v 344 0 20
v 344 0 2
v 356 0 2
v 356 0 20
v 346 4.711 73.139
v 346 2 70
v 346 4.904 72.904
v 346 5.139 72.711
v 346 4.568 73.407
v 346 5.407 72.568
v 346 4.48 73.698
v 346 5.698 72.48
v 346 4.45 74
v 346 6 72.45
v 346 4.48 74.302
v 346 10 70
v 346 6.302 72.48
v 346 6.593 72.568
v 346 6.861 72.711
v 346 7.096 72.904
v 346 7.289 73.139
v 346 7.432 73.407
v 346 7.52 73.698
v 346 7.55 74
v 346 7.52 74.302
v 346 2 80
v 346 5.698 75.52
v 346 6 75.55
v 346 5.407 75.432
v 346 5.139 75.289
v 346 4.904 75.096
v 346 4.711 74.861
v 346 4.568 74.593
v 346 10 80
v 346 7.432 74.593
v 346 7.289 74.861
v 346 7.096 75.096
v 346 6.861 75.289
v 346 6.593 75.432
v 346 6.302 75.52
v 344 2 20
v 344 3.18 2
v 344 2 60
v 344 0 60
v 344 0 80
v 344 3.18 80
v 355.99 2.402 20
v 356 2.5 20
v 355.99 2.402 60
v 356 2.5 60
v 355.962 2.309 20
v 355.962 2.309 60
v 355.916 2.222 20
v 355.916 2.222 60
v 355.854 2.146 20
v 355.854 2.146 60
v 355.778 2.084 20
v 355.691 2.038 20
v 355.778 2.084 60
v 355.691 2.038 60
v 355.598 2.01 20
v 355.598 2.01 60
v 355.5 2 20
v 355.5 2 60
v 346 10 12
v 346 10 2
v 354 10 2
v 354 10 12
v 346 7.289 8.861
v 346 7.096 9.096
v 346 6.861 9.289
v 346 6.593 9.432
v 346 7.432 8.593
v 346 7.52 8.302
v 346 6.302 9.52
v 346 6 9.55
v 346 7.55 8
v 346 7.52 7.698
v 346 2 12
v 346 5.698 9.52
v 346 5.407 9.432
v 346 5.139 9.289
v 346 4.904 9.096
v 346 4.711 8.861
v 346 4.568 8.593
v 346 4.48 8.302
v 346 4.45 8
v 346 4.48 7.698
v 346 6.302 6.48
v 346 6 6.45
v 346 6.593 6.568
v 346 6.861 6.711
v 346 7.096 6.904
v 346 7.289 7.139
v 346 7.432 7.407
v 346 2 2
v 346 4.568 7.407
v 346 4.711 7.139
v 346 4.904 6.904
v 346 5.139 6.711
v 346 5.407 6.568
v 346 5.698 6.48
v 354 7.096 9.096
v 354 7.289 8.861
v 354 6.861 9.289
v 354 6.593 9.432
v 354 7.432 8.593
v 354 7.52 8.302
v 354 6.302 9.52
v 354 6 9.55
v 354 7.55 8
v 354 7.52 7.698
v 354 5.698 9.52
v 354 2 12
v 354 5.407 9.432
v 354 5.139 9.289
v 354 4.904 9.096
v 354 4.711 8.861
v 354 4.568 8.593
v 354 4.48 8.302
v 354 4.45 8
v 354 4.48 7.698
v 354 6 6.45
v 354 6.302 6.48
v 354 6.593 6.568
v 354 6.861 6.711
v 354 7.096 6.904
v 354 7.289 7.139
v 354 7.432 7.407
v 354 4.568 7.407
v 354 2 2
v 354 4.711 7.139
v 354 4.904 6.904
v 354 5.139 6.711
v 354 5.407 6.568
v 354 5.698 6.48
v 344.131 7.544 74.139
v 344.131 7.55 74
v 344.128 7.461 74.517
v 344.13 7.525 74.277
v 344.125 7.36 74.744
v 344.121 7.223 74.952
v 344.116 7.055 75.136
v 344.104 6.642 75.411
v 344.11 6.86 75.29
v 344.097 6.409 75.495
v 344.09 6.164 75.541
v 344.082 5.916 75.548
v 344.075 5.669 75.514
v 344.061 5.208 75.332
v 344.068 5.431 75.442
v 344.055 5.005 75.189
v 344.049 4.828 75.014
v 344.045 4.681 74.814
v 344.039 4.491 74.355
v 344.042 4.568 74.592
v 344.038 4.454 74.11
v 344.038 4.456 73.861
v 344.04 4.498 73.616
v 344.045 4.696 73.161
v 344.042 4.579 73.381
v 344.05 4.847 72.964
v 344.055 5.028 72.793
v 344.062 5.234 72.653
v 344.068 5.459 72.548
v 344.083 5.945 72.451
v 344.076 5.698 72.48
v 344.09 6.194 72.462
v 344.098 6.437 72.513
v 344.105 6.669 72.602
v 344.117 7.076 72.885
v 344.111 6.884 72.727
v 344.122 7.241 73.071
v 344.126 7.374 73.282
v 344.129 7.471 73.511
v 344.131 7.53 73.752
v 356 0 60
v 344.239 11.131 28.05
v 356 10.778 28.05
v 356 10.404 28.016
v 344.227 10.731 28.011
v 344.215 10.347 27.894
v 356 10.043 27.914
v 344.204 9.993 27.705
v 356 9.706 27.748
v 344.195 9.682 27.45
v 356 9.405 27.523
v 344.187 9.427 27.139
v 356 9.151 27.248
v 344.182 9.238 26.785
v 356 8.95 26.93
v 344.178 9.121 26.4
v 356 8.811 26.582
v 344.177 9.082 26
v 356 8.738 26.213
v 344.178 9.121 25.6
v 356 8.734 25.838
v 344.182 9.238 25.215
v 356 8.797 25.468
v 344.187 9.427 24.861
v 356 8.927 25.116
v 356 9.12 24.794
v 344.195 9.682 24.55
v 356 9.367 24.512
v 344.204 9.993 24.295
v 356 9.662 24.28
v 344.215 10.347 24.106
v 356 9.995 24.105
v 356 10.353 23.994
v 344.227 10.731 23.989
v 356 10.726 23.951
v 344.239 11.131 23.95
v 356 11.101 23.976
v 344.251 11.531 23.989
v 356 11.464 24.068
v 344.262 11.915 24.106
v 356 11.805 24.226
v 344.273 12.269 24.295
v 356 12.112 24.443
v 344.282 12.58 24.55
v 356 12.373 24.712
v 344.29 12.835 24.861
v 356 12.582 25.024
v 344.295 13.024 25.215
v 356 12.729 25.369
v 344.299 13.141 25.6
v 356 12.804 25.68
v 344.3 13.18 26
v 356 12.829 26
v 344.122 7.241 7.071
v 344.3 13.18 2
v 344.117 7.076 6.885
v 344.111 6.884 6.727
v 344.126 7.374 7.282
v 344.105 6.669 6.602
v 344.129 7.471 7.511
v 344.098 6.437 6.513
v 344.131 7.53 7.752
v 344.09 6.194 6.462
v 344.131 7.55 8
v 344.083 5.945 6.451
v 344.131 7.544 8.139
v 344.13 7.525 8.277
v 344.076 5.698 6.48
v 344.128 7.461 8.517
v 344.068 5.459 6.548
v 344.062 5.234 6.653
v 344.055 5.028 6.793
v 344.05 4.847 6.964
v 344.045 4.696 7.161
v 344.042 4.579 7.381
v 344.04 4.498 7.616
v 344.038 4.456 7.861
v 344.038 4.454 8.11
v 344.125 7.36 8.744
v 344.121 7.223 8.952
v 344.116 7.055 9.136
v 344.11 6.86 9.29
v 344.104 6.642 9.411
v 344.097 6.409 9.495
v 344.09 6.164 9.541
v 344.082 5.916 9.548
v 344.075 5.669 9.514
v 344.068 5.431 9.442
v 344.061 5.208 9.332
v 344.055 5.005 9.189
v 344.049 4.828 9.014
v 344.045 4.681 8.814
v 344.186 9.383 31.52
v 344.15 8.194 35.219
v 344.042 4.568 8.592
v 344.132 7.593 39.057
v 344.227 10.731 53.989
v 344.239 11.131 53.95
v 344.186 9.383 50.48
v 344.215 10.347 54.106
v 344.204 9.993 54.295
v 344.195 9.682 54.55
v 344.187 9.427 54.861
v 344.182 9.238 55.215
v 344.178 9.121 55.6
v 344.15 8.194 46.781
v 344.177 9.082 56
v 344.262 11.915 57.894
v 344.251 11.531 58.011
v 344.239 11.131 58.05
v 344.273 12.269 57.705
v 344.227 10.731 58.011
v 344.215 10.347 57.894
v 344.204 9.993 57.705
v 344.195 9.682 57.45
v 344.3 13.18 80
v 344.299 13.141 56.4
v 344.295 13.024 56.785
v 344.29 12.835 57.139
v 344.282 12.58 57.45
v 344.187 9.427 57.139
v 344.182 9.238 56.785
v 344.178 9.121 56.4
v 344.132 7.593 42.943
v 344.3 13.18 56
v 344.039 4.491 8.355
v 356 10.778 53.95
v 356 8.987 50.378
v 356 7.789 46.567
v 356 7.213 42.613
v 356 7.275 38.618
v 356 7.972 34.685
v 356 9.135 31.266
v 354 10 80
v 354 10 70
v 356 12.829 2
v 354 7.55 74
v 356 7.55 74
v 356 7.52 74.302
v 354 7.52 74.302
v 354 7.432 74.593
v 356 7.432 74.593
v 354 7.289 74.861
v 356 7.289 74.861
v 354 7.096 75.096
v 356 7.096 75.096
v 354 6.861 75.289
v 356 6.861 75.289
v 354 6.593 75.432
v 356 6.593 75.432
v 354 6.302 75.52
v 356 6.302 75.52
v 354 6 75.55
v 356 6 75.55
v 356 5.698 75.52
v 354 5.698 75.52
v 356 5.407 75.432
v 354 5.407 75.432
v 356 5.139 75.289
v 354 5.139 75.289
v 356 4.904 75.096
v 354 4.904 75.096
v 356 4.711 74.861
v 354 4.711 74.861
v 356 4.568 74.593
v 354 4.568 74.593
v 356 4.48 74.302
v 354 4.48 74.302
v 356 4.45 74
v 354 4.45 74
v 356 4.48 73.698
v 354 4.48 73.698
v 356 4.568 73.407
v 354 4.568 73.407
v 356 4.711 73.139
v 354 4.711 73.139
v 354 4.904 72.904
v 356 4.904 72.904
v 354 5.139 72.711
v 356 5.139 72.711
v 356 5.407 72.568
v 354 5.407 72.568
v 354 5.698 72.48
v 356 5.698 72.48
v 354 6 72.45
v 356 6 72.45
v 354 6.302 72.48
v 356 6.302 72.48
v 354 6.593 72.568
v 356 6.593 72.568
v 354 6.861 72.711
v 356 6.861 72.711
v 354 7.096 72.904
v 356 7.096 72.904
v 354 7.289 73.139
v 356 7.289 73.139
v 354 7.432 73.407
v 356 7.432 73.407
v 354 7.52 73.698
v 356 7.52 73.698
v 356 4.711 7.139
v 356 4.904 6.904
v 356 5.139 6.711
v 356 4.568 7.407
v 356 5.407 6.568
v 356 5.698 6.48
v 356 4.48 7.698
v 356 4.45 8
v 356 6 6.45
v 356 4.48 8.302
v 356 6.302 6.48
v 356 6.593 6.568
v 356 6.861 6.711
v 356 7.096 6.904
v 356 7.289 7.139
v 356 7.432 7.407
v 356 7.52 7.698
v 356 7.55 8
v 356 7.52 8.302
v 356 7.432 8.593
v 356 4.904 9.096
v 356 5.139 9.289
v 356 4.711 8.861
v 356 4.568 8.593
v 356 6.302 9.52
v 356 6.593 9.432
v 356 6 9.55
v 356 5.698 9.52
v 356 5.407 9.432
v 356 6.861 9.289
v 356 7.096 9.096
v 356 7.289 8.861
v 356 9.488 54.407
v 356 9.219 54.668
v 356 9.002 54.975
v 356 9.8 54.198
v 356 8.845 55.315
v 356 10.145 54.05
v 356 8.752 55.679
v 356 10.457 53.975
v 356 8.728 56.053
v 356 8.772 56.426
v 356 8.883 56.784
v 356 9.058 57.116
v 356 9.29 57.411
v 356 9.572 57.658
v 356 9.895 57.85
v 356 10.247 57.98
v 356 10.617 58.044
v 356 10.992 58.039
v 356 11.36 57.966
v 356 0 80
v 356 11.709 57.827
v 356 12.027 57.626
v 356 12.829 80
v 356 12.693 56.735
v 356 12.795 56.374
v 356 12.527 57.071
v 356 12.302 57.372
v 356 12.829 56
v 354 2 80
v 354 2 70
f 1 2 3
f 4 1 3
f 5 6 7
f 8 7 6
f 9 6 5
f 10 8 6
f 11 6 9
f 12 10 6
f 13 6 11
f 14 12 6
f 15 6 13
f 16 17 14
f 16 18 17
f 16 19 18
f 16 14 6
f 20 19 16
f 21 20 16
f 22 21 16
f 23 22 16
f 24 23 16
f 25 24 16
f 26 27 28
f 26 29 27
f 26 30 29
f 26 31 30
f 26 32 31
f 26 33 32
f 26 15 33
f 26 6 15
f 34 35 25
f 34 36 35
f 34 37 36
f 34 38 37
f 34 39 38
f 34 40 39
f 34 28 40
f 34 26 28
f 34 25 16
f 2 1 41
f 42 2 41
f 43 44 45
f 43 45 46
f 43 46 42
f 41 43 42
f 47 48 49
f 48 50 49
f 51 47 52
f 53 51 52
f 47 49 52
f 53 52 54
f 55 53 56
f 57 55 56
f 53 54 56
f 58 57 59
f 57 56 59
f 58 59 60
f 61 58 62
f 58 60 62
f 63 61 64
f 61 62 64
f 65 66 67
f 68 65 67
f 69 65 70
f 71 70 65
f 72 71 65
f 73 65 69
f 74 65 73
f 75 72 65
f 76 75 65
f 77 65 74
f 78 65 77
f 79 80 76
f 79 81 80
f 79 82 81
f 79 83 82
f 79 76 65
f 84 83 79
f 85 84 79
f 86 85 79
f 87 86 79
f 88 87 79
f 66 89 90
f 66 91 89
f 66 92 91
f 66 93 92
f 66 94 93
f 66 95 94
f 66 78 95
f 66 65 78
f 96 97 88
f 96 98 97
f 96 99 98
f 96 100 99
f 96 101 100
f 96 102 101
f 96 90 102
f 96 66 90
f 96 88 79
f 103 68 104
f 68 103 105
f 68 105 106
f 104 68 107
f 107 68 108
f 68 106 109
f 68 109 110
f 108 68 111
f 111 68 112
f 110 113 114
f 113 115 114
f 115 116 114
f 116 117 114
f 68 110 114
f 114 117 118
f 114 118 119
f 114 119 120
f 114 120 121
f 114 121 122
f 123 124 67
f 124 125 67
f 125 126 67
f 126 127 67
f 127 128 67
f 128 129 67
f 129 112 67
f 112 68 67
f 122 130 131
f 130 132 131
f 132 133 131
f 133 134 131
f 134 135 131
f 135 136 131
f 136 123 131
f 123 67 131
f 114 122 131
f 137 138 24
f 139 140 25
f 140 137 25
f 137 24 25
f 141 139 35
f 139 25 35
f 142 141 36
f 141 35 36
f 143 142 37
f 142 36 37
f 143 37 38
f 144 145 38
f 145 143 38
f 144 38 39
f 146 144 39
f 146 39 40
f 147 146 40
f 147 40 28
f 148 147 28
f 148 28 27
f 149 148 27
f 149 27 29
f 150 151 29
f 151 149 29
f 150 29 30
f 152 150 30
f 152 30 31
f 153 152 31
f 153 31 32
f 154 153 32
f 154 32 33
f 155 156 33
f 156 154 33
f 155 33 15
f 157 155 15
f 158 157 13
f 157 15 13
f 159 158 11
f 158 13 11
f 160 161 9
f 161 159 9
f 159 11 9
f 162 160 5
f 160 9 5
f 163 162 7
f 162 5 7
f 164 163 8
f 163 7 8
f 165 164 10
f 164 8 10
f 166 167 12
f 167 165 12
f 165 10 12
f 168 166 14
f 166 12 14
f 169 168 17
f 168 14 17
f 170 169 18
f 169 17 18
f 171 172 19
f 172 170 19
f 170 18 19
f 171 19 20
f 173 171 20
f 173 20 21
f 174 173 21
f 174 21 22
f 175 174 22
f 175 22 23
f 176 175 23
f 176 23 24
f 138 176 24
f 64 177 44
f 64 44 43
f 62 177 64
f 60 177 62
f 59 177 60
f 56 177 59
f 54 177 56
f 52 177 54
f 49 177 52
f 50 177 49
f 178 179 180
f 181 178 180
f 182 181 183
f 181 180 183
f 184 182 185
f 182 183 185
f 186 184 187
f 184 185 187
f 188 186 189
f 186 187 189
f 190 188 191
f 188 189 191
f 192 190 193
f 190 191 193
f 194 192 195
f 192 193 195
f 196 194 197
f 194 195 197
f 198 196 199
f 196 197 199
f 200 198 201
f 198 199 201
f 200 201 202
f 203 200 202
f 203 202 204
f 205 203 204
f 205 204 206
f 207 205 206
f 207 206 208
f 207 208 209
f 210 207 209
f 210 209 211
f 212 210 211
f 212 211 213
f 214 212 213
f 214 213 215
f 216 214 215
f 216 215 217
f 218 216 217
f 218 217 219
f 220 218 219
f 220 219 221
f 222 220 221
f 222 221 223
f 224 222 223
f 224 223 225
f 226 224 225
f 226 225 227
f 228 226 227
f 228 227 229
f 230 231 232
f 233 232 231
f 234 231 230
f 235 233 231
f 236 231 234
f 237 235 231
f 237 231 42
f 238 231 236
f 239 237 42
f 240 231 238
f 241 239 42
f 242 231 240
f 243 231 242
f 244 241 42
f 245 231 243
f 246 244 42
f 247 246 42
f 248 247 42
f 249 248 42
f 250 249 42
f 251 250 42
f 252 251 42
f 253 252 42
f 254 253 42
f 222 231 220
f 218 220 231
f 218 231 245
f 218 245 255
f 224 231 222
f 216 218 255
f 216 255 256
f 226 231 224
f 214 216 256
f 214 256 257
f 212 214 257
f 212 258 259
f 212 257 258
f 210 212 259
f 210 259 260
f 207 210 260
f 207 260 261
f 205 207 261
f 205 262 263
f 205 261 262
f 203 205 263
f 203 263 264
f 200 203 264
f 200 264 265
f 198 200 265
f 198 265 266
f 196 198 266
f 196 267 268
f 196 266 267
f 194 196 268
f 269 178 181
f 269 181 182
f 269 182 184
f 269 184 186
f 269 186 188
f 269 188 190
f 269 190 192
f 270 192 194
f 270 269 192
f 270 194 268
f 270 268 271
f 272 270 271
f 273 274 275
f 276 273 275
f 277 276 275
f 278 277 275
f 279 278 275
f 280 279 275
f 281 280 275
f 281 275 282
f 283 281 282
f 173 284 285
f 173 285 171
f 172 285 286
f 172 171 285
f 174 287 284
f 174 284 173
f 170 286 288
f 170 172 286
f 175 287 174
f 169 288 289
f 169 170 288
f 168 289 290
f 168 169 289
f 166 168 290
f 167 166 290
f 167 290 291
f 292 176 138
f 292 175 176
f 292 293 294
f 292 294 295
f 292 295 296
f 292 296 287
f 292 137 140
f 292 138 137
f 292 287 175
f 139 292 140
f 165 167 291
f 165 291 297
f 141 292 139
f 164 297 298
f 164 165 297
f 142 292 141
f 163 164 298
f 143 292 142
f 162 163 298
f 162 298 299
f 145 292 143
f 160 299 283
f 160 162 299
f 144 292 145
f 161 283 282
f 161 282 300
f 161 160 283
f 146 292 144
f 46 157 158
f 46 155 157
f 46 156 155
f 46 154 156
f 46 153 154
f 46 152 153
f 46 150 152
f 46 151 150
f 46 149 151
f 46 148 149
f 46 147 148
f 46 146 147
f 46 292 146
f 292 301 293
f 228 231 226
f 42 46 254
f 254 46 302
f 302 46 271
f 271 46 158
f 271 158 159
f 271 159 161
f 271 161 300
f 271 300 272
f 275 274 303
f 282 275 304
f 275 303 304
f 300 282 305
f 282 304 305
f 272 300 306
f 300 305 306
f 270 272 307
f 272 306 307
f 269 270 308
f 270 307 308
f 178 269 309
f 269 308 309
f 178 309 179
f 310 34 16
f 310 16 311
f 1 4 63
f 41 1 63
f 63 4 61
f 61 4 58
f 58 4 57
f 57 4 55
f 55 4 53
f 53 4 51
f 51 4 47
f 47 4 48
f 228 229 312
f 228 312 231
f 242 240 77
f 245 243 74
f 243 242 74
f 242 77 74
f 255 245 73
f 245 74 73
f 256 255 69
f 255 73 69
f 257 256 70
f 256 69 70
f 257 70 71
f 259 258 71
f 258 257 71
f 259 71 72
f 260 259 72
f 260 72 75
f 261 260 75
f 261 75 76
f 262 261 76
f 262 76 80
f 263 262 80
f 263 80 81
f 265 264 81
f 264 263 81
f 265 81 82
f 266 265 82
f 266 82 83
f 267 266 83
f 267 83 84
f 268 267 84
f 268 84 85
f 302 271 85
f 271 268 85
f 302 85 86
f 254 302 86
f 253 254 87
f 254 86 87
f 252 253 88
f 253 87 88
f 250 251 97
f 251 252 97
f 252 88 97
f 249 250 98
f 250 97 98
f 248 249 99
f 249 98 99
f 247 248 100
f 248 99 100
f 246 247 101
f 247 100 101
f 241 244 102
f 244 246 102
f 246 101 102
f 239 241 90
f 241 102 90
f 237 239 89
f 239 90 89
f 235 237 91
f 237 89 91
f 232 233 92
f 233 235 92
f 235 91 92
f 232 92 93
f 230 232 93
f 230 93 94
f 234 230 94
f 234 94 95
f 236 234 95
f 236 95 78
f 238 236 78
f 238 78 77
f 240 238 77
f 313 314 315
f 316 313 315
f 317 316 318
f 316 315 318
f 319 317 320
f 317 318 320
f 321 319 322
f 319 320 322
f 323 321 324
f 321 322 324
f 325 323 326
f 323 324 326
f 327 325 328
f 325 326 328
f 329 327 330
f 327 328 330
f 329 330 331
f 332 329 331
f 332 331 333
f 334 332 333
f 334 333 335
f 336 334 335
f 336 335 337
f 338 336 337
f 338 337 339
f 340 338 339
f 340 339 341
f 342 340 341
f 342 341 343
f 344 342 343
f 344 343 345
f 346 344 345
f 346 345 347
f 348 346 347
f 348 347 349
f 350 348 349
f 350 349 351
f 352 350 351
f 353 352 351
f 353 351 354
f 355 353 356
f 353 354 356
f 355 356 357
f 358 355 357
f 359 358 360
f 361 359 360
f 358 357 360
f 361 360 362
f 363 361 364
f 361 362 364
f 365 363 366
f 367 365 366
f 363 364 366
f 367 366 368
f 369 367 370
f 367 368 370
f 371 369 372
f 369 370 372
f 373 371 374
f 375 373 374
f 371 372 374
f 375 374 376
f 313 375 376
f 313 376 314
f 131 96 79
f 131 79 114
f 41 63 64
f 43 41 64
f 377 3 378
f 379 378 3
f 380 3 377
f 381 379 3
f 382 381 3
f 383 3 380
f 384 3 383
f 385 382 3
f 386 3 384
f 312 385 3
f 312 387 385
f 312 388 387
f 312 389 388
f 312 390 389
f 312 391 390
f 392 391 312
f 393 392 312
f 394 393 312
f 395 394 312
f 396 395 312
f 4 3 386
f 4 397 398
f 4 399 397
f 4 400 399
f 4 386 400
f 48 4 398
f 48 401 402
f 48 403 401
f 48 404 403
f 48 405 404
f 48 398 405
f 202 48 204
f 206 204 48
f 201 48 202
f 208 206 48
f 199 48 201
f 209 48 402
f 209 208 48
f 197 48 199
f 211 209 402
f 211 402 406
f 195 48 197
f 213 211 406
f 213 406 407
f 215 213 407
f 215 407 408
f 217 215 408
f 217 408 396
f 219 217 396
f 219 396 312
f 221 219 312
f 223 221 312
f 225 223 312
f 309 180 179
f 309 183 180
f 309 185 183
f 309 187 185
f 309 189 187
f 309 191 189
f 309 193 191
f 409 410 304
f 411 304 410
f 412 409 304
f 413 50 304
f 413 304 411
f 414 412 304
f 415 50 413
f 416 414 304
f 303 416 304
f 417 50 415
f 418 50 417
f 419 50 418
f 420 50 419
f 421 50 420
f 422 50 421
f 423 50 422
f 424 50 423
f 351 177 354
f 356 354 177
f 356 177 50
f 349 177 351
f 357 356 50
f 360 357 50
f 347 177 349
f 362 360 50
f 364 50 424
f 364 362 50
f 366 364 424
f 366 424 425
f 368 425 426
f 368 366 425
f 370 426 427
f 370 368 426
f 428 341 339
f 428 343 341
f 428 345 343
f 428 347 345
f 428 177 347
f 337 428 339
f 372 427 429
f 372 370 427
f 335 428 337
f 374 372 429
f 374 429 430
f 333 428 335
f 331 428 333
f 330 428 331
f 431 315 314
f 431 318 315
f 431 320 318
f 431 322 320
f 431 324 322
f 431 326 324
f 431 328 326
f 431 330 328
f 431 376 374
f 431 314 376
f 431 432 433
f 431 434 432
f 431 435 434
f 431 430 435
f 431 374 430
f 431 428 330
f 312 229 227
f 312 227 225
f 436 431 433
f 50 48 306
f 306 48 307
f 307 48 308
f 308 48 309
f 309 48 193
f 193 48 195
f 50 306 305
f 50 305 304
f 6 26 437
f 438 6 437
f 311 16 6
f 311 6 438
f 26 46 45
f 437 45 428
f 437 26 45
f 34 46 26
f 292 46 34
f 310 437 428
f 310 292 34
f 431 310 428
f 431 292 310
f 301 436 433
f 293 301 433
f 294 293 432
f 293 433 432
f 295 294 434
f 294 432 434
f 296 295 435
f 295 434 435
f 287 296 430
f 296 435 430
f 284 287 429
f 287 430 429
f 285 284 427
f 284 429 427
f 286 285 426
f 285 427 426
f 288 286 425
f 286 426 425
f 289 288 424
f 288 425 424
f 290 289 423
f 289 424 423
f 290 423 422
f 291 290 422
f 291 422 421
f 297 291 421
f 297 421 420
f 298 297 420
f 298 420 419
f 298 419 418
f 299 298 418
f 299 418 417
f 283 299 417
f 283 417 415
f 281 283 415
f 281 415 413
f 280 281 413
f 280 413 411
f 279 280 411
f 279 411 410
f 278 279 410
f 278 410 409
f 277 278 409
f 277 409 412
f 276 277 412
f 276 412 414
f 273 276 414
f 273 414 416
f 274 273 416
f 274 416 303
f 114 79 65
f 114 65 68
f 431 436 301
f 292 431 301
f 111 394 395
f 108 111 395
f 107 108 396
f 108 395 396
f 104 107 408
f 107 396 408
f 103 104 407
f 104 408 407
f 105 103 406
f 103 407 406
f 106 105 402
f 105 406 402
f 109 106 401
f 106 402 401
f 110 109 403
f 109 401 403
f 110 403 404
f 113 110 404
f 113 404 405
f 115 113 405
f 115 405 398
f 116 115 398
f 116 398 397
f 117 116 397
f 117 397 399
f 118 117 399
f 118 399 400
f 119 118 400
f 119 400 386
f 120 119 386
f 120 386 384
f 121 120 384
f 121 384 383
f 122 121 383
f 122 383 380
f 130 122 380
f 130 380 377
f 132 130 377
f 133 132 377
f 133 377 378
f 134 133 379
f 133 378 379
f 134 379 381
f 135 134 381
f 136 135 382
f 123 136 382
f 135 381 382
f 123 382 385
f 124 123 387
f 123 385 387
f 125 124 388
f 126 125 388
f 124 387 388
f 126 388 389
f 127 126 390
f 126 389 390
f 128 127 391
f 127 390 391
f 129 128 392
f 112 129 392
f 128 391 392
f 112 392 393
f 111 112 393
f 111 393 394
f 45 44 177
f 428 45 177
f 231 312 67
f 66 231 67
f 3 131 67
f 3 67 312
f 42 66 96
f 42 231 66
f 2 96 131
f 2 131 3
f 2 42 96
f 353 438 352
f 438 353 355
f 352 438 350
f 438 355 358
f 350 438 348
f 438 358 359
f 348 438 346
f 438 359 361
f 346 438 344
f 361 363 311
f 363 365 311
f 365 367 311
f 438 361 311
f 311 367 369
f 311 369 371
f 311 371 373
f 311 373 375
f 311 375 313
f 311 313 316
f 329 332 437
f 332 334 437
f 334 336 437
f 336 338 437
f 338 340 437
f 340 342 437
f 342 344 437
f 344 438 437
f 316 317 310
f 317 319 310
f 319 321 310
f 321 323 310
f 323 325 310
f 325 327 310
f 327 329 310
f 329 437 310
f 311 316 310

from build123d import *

# Parameters (mm, degrees)
PAD_DEPTH       = 80
POCKET_DEPTH    = 78
POCKET001_DEPTH = 408.7079232475
POCKET002_DEPTH = 408.4326470939
SKETCH004_W     = 433.609177
SKETCH004_H     = 149.2376851805
SKETCH004_W_2   = 114.034424
SKETCH004_H_2   = 150.6867891805
POCKET003_DEPTH = 80.001
SKETCH005_W     = 8
SKETCH005_H     = 8
POCKET004_DEPTH = 10
SKETCH006_W     = 8
SKETCH006_H     = 8
POCKET005_DEPTH = 12
SKETCH007_R     = 1.55
POCKET006_DEPTH = 12.001
POCKET007_DEPTH = 12.001
SKETCH009_W     = 2
SKETCH009_H     = 40
POCKET008_DEPTH = 12.001
FILLET_R        = 0.5


with BuildPart() as part:
    # Sketch → Pad (new body)
    with BuildSketch(Plane.XY):
        Polygon((450, 0), (450, 90), (356, 87.18), (355.64, 99.18), (343.64, 98.82), (344, 86.82), (6, 76.68), (5.64, 88.6800000001), (-6.36, 88.3200000001), (-6, 76.32), (-50, 75), (-50, 0), align=None)
    extrude(amount=PAD_DEPTH)

    # Sketch001 (on Face14 of Pad) → Pocket (cut)
    with BuildSketch(Plane.XY.offset(80)):
        Polygon((-50, 15), (-50, 74), (450, 74), (450, 0), (356, 2.82), (356.3, 12.82), (344.3, 13.18), (344, 3.18), (6, 13.32), (6.3, 23.32), (-5.7, 23.68), (-6, 13.68), align=None)
    extrude(amount=-POCKET_DEPTH, mode=Mode.SUBTRACT)

    # Sketch002 (on Face26 of Pocket) → Pocket001 (cut, through all)
    with BuildSketch(Plane(origin=(355.5953641722, -10.6678609252, 0), x_dir=(0.0299865091, 0.9995503035, 0), z_dir=(0.9995503035, -0.0299865091, 0))):
        with BuildLine():
            ThreePointArc((23.4984280855, 56), (19.9988591841, 57.4495689014), (21.4484280855, 53.95))
            ThreePointArc((21.4484280855, 53.95), (17.8329435114, 41), (21.4484280855, 28.05))
            ThreePointArc((21.4484280855, 28.05), (19.9988591841, 24.5504310986), (23.4984280855, 26))
            Line((23.4984280855, 26), (23.4984280855, 56))
        make_face()
    extrude(amount=-POCKET001_DEPTH, mode=Mode.SUBTRACT)

    # Sketch003 (on Face14 of Pocket001) → Pocket002 (cut, through all)
    with BuildSketch(Plane(origin=(358.2929363573, 10.7487880907, 0), x_dir=(-0.0299865091, 0.9995503035, 0), z_dir=(0.9995503035, 0.0299865091, 0))):
        with BuildLine():
            ThreePointArc((88.470997005, 56), (84.9714281036, 57.4495689014), (86.420997005, 53.95))
            ThreePointArc((86.420997005, 53.95), (82.8055124309, 41), (86.420997005, 28.05))
            ThreePointArc((86.420997005, 28.05), (84.9714281036, 24.5504310986), (88.470997005, 26))
            Line((88.470997005, 26), (88.470997005, 56))
        make_face()
    extrude(amount=-POCKET002_DEPTH, mode=Mode.SUBTRACT)

    # Sketch004 (on Face7 of Pocket002) → Pocket003 (cut, through all)
    with BuildSketch(Plane.XY.offset(80)):
        with Locations((127.1954115, 57.2464115903)):
            Rectangle(SKETCH004_W, SKETCH004_H)
        with Locations((413.017212, 56.5218595903)):
            Rectangle(SKETCH004_W_2, SKETCH004_H_2)
    extrude(amount=-POCKET003_DEPTH, mode=Mode.SUBTRACT)

    # Sketch005 (on Face8 of Pocket003) → Pocket004 (cut)
    with BuildSketch(Plane.XY.offset(80)):
        with Locations((350, 88)):
            Rectangle(SKETCH005_W, SKETCH005_H)
        with Locations((350, 6)):
            Rectangle(SKETCH005_W, SKETCH005_H)
    extrude(amount=-POCKET004_DEPTH, mode=Mode.SUBTRACT)

    # Sketch006 (on Face1 of Pocket004) → Pocket005 (cut)
    with BuildSketch(Plane(origin=(0, 0, 0), x_dir=(1, 0, 0), z_dir=(0, 0, -1))):
        with Locations((350, -6)):
            Rectangle(SKETCH006_W, SKETCH006_H)
        with Locations((350, -88)):
            Rectangle(SKETCH006_W, SKETCH006_H)
    extrude(amount=-POCKET005_DEPTH, mode=Mode.SUBTRACT)

    # Sketch007 (on Face6 of Pocket005) → Pocket006 (cut, through all)
    with BuildSketch(Plane.YZ.offset(356)):
        with Locations((6, 74)):
            Circle(SKETCH007_R)
        with Locations((88, 74)):
            Circle(SKETCH007_R)
        with Locations((88, 8)):
            Circle(SKETCH007_R)
        with Locations((6, 8)):
            Circle(SKETCH007_R)
    extrude(amount=-POCKET006_DEPTH, mode=Mode.SUBTRACT)

    # Sketch008 (on Face2 of Pocket006) → Pocket007 (cut, through all)
    with BuildSketch(Plane(origin=(344, 0, 0), x_dir=(0, -1, 0), z_dir=(-1, 0, 0))):
        Polygon((-136.047638, 92.811623), (-13.18, 92.811623), (-13.18, 2), (21.701658, 2), (21.701658, -28.608723), (-136.047638, -28.608723), align=None)
    extrude(amount=-POCKET007_DEPTH, mode=Mode.SUBTRACT)

    # Sketch009 (on Face13 of Pocket007) → Pocket008 (cut, through all)
    with BuildSketch(Plane.YZ.offset(356)):
        with Locations((1, 40)):
            Rectangle(SKETCH009_W, SKETCH009_H)
    extrude(amount=-POCKET008_DEPTH, mode=Mode.SUBTRACT)

    # Fillet
    fillet_edges = [part.edges().sort_by_distance(p)[0] for p in [
        (356, 2, 40),
    ]]
    fillet(fillet_edges, radius=FILLET_R)


solid = part.part
